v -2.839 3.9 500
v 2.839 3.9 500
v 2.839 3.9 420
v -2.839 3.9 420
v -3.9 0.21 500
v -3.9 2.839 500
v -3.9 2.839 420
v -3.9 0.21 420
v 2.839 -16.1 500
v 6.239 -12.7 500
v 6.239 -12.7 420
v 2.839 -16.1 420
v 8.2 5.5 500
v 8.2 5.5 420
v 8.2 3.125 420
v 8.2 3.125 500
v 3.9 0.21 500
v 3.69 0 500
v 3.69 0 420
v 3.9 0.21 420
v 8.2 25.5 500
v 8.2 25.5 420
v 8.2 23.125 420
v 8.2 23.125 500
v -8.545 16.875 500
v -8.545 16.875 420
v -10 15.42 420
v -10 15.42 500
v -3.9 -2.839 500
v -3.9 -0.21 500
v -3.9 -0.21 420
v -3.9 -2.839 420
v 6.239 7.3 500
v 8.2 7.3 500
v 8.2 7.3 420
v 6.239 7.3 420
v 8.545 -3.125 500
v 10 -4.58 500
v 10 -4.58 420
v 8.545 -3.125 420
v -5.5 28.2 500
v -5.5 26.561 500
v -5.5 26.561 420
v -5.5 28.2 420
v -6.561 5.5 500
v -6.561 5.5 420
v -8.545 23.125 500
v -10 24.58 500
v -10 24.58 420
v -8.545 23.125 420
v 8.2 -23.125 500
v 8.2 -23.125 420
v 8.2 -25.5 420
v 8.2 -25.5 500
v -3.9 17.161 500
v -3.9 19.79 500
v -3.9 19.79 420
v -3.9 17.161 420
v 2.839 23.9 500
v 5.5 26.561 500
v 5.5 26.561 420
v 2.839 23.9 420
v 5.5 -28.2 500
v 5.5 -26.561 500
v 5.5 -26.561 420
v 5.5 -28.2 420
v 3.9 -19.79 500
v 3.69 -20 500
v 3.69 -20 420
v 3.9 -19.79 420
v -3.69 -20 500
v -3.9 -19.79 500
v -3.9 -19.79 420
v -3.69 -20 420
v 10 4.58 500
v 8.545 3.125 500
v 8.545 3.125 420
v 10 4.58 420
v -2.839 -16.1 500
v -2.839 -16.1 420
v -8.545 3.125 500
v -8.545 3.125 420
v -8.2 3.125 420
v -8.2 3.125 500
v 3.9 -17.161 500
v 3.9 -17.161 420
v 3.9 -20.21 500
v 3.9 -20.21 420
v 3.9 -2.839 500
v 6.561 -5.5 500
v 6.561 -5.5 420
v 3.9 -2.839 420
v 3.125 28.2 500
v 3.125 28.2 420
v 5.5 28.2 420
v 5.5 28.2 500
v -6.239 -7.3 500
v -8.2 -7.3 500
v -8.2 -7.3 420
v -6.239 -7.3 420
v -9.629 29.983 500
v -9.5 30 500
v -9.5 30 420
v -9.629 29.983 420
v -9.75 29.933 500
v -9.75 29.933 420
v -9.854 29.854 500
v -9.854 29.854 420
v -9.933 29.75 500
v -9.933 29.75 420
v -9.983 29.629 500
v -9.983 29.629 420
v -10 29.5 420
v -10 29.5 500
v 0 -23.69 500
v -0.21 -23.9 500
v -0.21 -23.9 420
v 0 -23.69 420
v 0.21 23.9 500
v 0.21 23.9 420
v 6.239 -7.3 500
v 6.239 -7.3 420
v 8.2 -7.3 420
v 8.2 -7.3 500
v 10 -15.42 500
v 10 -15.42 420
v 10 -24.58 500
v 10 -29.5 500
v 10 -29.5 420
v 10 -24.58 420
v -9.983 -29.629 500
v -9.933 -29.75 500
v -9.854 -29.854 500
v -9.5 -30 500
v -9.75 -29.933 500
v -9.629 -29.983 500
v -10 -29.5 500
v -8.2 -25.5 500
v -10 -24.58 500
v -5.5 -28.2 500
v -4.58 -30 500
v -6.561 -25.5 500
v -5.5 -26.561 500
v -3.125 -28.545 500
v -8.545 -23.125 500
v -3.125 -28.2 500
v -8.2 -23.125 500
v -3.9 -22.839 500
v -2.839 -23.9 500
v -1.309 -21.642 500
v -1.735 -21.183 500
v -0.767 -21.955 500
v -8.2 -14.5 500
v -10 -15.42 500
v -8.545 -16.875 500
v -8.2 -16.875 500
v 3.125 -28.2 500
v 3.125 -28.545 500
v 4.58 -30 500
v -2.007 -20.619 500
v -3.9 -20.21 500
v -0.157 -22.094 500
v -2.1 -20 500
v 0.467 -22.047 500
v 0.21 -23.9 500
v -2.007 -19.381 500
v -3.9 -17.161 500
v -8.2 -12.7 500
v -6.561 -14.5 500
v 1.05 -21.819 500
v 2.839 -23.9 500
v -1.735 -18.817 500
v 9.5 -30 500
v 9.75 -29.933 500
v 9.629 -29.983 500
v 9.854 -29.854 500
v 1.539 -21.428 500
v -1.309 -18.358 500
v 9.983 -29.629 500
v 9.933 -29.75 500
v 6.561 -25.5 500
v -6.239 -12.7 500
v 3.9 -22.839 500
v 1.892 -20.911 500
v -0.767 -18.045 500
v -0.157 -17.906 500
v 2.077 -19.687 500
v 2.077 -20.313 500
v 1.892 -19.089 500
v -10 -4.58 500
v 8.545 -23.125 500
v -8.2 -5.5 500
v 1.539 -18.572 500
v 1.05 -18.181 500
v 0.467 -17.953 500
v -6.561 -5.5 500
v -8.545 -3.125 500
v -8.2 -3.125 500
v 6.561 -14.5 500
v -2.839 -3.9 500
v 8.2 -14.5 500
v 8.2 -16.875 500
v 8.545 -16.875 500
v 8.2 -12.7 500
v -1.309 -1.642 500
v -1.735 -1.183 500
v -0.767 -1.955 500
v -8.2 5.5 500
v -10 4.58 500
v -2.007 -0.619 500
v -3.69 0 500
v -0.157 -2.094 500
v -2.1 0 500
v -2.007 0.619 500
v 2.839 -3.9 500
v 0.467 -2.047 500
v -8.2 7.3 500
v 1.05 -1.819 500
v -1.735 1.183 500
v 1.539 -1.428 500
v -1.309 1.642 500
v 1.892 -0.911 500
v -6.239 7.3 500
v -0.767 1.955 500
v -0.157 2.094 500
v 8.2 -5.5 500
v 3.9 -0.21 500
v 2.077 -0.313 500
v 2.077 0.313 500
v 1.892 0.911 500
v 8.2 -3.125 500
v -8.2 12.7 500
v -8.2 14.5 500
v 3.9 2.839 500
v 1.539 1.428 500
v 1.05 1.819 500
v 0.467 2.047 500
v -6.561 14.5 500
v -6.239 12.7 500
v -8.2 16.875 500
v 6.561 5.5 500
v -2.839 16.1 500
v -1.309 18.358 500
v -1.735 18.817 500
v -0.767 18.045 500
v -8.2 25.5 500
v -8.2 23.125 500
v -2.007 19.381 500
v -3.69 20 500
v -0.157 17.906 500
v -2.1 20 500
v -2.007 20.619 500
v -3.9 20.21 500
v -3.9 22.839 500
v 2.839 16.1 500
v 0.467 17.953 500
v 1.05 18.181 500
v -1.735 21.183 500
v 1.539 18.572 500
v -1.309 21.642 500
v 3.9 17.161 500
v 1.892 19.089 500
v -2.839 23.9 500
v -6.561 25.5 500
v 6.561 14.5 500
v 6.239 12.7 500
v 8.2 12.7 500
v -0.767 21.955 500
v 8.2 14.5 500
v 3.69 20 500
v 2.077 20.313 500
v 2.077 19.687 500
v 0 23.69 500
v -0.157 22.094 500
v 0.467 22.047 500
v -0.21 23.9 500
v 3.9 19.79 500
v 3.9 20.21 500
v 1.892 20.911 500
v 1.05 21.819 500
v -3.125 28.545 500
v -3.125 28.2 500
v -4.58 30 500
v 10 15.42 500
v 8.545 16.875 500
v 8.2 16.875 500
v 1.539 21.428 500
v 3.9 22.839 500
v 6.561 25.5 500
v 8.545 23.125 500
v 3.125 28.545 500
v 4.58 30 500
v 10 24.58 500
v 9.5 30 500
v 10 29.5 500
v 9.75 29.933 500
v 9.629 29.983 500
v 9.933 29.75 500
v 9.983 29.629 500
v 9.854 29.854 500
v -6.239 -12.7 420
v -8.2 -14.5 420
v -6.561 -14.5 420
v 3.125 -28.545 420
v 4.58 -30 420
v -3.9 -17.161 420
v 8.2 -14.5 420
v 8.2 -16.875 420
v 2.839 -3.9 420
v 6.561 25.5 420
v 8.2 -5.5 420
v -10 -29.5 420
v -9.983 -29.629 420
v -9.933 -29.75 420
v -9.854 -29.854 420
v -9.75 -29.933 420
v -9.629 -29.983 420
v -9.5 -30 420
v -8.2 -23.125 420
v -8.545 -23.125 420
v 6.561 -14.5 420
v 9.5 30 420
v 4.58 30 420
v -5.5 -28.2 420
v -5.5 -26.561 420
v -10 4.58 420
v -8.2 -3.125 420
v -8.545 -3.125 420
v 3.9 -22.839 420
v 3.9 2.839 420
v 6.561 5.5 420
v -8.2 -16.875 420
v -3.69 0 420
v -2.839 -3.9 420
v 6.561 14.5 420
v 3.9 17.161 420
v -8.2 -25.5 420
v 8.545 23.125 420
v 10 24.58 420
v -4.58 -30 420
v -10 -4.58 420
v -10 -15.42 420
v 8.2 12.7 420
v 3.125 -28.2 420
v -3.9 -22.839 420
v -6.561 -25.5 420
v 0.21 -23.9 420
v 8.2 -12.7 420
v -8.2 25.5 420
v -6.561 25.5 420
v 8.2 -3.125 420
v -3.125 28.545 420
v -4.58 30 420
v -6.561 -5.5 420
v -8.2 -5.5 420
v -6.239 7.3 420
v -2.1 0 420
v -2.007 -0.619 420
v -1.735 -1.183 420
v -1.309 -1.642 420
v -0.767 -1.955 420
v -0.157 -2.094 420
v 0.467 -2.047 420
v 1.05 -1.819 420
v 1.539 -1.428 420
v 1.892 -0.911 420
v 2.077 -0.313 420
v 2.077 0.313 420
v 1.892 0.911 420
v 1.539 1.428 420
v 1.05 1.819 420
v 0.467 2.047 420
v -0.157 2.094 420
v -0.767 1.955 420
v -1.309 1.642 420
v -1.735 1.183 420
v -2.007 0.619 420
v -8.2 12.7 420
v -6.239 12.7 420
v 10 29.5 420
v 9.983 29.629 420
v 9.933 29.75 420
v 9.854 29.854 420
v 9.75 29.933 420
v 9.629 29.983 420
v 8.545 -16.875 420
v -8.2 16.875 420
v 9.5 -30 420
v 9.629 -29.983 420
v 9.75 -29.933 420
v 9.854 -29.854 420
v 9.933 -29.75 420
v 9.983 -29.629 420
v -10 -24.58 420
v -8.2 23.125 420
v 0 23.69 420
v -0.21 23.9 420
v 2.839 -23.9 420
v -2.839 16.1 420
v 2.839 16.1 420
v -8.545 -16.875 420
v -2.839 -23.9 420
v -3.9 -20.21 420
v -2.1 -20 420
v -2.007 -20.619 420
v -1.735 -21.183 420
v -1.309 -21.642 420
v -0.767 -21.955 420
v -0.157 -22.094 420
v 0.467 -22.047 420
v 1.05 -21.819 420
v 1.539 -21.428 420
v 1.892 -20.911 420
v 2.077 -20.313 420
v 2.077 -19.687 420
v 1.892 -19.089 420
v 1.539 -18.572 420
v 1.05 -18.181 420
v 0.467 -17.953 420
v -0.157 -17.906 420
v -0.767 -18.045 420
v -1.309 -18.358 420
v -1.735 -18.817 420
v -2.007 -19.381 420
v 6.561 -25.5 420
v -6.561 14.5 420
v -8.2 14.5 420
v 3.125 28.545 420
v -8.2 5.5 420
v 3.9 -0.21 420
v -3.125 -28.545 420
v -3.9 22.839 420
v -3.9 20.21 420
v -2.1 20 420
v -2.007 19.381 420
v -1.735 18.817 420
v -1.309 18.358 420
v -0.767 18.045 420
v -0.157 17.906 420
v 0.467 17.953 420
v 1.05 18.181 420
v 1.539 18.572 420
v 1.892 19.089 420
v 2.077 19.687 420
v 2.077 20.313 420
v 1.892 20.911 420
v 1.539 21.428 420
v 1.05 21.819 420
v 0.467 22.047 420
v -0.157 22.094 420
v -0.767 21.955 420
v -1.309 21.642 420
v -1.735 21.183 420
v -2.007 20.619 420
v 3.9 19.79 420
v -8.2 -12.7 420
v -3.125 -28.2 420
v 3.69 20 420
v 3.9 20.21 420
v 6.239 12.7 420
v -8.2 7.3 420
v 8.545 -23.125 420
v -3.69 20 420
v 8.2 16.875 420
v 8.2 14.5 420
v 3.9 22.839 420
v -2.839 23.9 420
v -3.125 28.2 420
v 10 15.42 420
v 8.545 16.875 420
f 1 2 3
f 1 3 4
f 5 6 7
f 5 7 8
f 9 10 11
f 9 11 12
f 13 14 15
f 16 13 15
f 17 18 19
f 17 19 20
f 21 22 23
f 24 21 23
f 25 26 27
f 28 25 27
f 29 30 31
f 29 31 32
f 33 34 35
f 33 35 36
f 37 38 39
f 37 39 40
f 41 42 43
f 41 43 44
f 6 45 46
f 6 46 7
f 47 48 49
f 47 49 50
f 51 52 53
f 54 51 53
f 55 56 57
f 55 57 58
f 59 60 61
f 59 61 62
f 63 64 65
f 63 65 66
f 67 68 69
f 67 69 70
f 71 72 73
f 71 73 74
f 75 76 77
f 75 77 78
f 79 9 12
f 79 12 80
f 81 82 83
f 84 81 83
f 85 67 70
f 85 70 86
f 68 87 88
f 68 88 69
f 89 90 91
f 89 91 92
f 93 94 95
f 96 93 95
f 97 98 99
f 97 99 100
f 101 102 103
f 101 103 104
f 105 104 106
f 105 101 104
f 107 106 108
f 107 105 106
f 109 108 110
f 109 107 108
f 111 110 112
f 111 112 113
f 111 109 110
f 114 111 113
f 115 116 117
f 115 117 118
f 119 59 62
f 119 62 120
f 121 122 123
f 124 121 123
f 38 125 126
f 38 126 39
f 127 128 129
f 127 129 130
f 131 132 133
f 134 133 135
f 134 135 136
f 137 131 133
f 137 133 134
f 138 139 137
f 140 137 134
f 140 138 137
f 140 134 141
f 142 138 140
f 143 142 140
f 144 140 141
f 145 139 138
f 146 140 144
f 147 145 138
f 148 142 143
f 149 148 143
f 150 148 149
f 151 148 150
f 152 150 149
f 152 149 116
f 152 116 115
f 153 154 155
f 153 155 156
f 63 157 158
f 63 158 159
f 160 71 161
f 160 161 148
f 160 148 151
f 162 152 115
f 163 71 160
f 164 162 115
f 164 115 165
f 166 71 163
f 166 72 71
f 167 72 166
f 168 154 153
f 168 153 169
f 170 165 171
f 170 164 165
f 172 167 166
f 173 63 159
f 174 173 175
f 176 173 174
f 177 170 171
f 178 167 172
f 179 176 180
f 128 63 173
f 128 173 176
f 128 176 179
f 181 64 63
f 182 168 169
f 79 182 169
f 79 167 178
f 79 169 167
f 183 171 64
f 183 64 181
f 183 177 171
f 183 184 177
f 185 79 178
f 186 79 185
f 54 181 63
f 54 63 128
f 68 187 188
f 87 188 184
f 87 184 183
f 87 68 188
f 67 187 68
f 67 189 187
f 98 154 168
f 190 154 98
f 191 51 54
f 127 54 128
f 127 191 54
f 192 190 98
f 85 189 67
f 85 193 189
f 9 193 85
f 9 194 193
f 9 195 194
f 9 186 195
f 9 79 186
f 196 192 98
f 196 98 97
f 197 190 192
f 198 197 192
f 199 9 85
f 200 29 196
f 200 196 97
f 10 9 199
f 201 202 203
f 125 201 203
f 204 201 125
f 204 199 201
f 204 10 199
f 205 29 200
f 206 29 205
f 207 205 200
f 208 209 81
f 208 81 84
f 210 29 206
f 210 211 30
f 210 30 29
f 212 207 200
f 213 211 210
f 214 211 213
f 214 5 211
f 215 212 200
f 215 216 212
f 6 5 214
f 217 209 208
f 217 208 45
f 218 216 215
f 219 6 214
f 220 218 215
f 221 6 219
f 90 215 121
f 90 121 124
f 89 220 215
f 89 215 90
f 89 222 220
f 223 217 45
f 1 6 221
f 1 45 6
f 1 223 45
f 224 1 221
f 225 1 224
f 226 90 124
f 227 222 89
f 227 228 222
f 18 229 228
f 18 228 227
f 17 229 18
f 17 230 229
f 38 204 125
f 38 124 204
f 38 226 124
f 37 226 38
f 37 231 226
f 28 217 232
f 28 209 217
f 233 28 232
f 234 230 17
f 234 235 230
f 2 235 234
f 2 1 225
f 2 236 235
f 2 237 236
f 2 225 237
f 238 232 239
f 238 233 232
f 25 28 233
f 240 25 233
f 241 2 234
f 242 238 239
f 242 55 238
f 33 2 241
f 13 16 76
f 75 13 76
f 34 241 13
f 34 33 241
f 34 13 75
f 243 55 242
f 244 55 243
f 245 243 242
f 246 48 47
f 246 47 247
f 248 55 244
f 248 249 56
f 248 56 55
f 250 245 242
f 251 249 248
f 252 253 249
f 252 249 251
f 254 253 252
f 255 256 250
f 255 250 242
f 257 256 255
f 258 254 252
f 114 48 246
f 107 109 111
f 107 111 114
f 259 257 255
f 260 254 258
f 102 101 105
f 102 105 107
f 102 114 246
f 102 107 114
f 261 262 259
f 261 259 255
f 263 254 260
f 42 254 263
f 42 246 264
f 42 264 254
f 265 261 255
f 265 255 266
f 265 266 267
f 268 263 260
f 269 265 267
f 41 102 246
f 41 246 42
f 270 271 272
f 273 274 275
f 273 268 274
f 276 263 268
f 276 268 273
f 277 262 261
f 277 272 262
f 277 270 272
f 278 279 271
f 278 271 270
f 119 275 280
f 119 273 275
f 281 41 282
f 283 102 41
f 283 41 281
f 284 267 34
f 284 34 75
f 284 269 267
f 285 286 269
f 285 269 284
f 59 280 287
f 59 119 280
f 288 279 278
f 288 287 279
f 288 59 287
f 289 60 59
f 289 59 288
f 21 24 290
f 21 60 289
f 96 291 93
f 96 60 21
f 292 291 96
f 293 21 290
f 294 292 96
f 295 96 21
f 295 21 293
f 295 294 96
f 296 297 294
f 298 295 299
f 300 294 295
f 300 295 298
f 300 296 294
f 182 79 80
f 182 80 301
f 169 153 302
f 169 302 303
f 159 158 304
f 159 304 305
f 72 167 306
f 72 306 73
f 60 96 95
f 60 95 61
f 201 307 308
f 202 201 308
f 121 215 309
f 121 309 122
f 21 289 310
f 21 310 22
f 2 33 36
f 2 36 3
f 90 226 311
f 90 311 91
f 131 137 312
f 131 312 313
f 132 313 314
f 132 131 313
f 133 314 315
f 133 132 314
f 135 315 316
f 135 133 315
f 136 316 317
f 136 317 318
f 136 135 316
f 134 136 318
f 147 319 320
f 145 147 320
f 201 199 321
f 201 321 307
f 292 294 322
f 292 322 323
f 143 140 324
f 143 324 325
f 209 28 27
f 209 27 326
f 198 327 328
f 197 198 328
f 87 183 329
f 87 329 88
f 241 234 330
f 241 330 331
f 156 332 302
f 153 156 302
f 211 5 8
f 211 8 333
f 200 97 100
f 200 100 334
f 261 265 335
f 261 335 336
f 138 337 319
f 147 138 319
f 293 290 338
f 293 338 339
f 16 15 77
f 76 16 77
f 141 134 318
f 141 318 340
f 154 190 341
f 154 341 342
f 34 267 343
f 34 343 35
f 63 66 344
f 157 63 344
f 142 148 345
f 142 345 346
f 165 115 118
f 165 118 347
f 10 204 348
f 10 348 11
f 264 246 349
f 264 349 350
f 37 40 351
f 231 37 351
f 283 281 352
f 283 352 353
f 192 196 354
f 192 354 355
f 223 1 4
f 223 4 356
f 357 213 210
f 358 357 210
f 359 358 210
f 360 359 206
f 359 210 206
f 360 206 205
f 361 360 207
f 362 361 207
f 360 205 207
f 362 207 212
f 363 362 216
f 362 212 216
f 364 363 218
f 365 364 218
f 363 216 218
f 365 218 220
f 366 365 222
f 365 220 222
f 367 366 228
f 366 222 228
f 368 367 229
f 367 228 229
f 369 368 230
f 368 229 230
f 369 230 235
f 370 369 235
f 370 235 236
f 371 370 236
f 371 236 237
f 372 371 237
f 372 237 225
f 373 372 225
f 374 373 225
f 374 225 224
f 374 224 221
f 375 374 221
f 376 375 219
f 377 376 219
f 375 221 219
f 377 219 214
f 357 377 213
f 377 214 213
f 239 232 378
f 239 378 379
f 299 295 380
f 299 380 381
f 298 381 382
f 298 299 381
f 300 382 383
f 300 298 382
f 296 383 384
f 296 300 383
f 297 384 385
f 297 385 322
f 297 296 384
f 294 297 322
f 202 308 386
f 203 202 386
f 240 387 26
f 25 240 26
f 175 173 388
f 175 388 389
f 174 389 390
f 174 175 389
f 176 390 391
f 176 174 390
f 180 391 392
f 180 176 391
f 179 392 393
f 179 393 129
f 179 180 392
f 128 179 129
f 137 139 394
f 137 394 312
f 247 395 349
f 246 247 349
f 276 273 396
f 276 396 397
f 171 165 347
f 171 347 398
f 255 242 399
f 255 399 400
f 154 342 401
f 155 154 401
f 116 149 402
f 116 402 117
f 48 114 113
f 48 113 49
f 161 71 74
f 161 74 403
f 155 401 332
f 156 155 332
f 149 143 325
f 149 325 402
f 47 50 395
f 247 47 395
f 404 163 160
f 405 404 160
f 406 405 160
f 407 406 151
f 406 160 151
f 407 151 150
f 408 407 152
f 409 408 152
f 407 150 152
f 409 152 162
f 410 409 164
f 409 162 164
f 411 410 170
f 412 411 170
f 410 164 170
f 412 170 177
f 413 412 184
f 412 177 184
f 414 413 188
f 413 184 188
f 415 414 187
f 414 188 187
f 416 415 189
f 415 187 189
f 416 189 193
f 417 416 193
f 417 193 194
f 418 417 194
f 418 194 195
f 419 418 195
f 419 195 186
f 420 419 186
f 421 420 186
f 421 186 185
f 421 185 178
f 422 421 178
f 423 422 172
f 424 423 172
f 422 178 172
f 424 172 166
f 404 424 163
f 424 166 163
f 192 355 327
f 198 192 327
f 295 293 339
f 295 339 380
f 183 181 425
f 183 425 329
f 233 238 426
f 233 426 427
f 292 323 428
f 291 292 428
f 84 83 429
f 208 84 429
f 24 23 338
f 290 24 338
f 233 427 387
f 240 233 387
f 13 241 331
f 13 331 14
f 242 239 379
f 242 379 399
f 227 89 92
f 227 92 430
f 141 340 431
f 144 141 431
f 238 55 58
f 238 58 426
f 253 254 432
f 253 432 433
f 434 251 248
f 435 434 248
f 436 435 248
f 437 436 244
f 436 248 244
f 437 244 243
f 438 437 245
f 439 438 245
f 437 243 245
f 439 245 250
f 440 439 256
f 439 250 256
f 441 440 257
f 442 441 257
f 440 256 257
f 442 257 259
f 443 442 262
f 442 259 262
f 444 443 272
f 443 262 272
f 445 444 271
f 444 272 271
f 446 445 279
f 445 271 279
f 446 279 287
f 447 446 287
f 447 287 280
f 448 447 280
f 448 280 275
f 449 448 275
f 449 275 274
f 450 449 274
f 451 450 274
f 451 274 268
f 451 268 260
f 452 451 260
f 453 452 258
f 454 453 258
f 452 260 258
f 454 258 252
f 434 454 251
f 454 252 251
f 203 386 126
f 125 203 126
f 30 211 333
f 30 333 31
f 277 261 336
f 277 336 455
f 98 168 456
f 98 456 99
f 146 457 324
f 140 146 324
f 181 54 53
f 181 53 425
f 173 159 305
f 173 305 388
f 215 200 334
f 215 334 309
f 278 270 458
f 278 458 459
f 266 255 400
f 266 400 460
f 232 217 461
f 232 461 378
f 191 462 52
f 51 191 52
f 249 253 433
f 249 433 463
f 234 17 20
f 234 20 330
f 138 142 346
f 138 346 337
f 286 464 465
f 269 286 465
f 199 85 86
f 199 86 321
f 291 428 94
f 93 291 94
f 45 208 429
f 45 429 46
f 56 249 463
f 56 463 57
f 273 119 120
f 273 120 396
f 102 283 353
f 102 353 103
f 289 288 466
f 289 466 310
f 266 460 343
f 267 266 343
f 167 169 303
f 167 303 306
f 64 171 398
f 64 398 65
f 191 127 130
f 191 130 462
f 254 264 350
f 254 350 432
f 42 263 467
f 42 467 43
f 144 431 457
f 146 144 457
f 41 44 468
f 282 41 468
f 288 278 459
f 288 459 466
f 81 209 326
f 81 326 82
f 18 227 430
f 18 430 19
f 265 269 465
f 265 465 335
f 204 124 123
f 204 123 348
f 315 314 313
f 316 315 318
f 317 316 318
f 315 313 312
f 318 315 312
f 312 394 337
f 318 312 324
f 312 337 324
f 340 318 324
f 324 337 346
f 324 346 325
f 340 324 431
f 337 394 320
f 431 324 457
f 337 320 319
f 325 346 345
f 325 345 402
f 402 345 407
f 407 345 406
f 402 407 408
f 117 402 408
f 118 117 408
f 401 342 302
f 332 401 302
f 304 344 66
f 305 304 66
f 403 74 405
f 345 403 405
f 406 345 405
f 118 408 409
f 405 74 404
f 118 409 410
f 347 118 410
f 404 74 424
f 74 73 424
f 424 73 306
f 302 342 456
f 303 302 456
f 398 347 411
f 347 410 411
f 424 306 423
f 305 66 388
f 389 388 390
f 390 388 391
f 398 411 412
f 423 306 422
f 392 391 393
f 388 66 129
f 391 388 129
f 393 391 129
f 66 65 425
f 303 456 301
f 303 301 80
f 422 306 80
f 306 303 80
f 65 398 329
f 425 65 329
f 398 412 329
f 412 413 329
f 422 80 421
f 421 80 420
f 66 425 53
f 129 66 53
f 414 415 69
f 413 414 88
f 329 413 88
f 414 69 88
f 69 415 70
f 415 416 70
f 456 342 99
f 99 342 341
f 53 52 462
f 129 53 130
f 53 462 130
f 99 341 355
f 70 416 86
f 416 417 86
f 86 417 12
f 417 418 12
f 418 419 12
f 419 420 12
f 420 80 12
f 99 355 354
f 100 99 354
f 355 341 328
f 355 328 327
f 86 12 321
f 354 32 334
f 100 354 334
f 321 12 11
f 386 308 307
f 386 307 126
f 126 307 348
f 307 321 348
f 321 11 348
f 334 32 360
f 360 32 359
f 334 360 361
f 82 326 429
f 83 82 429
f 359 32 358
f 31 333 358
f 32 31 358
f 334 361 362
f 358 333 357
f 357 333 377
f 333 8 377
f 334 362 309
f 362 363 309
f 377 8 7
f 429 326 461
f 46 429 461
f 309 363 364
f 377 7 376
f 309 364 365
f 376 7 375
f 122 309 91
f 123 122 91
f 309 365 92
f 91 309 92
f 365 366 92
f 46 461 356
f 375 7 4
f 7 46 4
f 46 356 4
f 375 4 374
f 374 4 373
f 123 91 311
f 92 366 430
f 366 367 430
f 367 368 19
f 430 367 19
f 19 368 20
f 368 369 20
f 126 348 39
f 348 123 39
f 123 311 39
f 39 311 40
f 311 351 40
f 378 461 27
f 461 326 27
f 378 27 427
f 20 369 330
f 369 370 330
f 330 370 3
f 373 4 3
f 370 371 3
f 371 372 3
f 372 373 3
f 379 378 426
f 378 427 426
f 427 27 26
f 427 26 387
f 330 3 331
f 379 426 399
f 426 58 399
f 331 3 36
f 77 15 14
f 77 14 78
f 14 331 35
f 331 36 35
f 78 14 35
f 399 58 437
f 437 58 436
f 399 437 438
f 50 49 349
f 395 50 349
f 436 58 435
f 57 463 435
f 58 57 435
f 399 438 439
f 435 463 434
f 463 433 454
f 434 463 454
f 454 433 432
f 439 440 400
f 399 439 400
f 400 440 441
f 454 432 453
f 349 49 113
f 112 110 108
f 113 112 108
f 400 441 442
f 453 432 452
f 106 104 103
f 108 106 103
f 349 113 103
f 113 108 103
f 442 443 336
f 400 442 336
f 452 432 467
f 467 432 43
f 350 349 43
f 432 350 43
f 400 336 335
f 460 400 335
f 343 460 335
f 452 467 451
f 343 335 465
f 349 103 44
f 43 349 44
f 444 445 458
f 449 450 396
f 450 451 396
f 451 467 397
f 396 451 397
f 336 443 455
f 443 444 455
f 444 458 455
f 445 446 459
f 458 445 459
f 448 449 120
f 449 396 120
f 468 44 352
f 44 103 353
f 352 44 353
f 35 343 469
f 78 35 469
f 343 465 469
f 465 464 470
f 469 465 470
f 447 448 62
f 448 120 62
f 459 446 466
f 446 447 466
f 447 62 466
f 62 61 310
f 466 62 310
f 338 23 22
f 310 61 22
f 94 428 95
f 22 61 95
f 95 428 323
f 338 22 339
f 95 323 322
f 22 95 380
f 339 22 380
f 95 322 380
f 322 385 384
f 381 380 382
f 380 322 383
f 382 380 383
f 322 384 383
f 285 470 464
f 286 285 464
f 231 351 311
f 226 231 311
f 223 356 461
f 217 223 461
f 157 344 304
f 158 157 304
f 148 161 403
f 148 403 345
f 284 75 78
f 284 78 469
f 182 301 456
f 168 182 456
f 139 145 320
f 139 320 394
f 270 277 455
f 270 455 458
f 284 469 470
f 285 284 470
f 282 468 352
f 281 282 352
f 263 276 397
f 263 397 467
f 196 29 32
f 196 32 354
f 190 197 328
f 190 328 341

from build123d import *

# Parameters (mm, degrees)
SKETCH1_R           = 2.1
BOSS_EXTRUDE1_DEPTH = 80


with BuildPart() as part:
    # Sketch1 → Boss-Extrude1 (new body)
    with BuildSketch(Plane.XY.offset(500)):
        with BuildLine():
            Line((6.560660172, 14.5), (3.9, 17.160660172))
            Line((3.9, 17.160660172), (3.9, 19.79))
            Line((3.9, 19.79), (3.69, 20))
            Line((3.69, 20), (3.9, 20.21))
            Line((3.9, 20.21), (3.9, 22.839339828))
            Line((3.9, 22.839339828), (6.560660172, 25.5))
            Line((6.560660172, 25.5), (8.2, 25.5))
            Line((8.2, 25.5), (8.2, 23.125))
            Line((8.2, 23.125), (8.545, 23.125))
            Line((8.545, 23.125), (10, 24.58))
            Line((10, 24.58), (10, 29.5))
            ThreePointArc((10, 29.5), (9.853553391, 29.853553391), (9.5, 30))
            Line((9.5, 30), (4.58, 30))
            Line((4.58, 30), (3.125, 28.545))
            Line((3.125, 28.545), (3.125, 28.2))
            Line((3.125, 28.2), (5.5, 28.2))
            Line((5.5, 28.2), (5.5, 26.560660172))
            Line((5.5, 26.560660172), (2.839339828, 23.9))
            Line((2.839339828, 23.9), (0.21, 23.9))
            Line((0.21, 23.9), (0, 23.69))
            Line((0, 23.69), (-0.21, 23.9))
            Line((-0.21, 23.9), (-2.839339828, 23.9))
            Line((-2.839339828, 23.9), (-5.5, 26.560660172))
            Line((-5.5, 26.560660172), (-5.5, 28.2))
            Line((-5.5, 28.2), (-3.125, 28.2))
            Line((-3.125, 28.2), (-3.125, 28.545))
            Line((-3.125, 28.545), (-4.58, 30))
            Line((-4.58, 30), (-9.5, 30))
            ThreePointArc((-9.5, 30), (-9.853553391, 29.853553391), (-10, 29.5))
            Line((-10, 29.5), (-10, 24.58))
            Line((-10, 24.58), (-8.545, 23.125))
            Line((-8.545, 23.125), (-8.2, 23.125))
            Line((-8.2, 23.125), (-8.2, 25.5))
            Line((-8.2, 25.5), (-6.560660172, 25.5))
            Line((-6.560660172, 25.5), (-3.9, 22.839339828))
            Line((-3.9, 22.839339828), (-3.9, 20.21))
            Line((-3.9, 20.21), (-3.69, 20))
            Line((-3.69, 20), (-3.9, 19.79))
            Line((-3.9, 19.79), (-3.9, 17.160660172))
            Line((-3.9, 17.160660172), (-6.560660172, 14.5))
            Line((-6.560660172, 14.5), (-8.2, 14.5))
            Line((-8.2, 14.5), (-8.2, 16.875))
            Line((-8.2, 16.875), (-8.545, 16.875))
            Line((-8.545, 16.875), (-10, 15.42))
            Line((-10, 15.42), (-10, 4.58))
            Line((-10, 4.58), (-8.545, 3.125))
            Line((-8.545, 3.125), (-8.2, 3.125))
            Line((-8.2, 3.125), (-8.2, 5.5))
            Line((-8.2, 5.5), (-6.560660172, 5.5))
            Line((-6.560660172, 5.5), (-3.9, 2.839339828))
            Line((-3.9, 2.839339828), (-3.9, 0.21))
            Line((-3.9, 0.21), (-3.69, 0))
            Line((-3.69, 0), (-3.9, -0.21))
            Line((-3.9, -0.21), (-3.9, -2.839339828))
            Line((-3.9, -2.839339828), (-6.560660172, -5.5))
            Line((-6.560660172, -5.5), (-8.2, -5.5))
            Line((-8.2, -5.5), (-8.2, -3.125))
            Line((-8.2, -3.125), (-8.545, -3.125))
            Line((-8.545, -3.125), (-10, -4.58))
            Line((-10, -4.58), (-10, -15.42))
            Line((-10, -15.42), (-8.545, -16.875))
            Line((-8.545, -16.875), (-8.2, -16.875))
            Line((-8.2, -16.875), (-8.2, -14.5))
            Line((-8.2, -14.5), (-6.560660172, -14.5))
            Line((-6.560660172, -14.5), (-3.9, -17.160660172))
            Line((-3.9, -17.160660172), (-3.9, -19.79))
            Line((-3.9, -19.79), (-3.69, -20))
            Line((-3.69, -20), (-3.9, -20.21))
            Line((-3.9, -20.21), (-3.9, -22.839339828))
            Line((-3.9, -22.839339828), (-6.560660172, -25.5))
            Line((-6.560660172, -25.5), (-8.2, -25.5))
            Line((-8.2, -25.5), (-8.2, -23.125))
            Line((-8.2, -23.125), (-8.545, -23.125))
            Line((-8.545, -23.125), (-10, -24.58))
            Line((-10, -24.58), (-10, -29.5))
            ThreePointArc((-10, -29.5), (-9.853553391, -29.853553391), (-9.5, -30))
            Line((-9.5, -30), (-4.58, -30))
            Line((-4.58, -30), (-3.125, -28.545))
            Line((-3.125, -28.545), (-3.125, -28.2))
            Line((-3.125, -28.2), (-5.5, -28.2))
            Line((-5.5, -28.2), (-5.5, -26.560660172))
            Line((-5.5, -26.560660172), (-2.839339828, -23.9))
            Line((-2.839339828, -23.9), (-0.21, -23.9))
            Line((-0.21, -23.9), (0, -23.69))
            Line((0, -23.69), (0.21, -23.9))
            Line((0.21, -23.9), (2.839339828, -23.9))
            Line((2.839339828, -23.9), (5.5, -26.560660172))
            Line((5.5, -26.560660172), (5.5, -28.2))
            Line((5.5, -28.2), (3.125, -28.2))
            Line((3.125, -28.2), (3.125, -28.545))
            Line((3.125, -28.545), (4.58, -30))
            Line((4.58, -30), (9.5, -30))
            ThreePointArc((9.5, -30), (9.853553391, -29.853553391), (10, -29.5))
            Line((10, -29.5), (10, -24.58))
            Line((10, -24.58), (8.545, -23.125))
            Line((8.545, -23.125), (8.2, -23.125))
            Line((8.2, -23.125), (8.2, -25.5))
            Line((8.2, -25.5), (6.560660172, -25.5))
            Line((6.560660172, -25.5), (3.9, -22.839339828))
            Line((3.9, -22.839339828), (3.9, -20.21))
            Line((3.9, -20.21), (3.69, -20))
            Line((3.69, -20), (3.9, -19.79))
            Line((3.9, -19.79), (3.9, -17.160660172))
            Line((3.9, -17.160660172), (6.560660172, -14.5))
            Line((6.560660172, -14.5), (8.2, -14.5))
            Line((8.2, -14.5), (8.2, -16.875))
            Line((8.2, -16.875), (8.545, -16.875))
            Line((8.545, -16.875), (10, -15.42))
            Line((10, -15.42), (10, -4.58))
            Line((10, -4.58), (8.545, -3.125))
            Line((8.545, -3.125), (8.2, -3.125))
            Line((8.2, -3.125), (8.2, -5.5))
            Line((8.2, -5.5), (6.560660172, -5.5))
            Line((6.560660172, -5.5), (3.9, -2.839339828))
            Line((3.9, -2.839339828), (3.9, -0.21))
            Line((3.9, -0.21), (3.69, 0))
            Line((3.69, 0), (3.9, 0.21))
            Line((3.9, 0.21), (3.9, 2.839339828))
            Line((3.9, 2.839339828), (6.560660172, 5.5))
            Line((6.560660172, 5.5), (8.2, 5.5))
            Line((8.2, 5.5), (8.2, 3.125))
            Line((8.2, 3.125), (8.545, 3.125))
            Line((8.545, 3.125), (10, 4.58))
            Line((10, 4.58), (10, 15.42))
            Line((10, 15.42), (8.545, 16.875))
            Line((8.545, 16.875), (8.2, 16.875))
            Line((8.2, 16.875), (8.2, 14.5))
            Line((8.2, 14.5), (6.560660172, 14.5))
        make_face()
        with Locations(Location((0, 20, 0), (0, 0, 180))):
            Circle(SKETCH1_R, mode=Mode.SUBTRACT)
        with Locations(Location((0, 0, 0), (0, 0, 180))):
            Circle(SKETCH1_R, mode=Mode.SUBTRACT)
        with Locations(Location((0, -20, 0), (0, 0, 180))):
            Circle(SKETCH1_R, mode=Mode.SUBTRACT)
        Polygon((2.839339828, 3.9), (-2.839339828, 3.9), (-6.239339828, 7.3), (-8.2, 7.3), (-8.2, 12.7), (-6.239339828, 12.7), (-2.839339828, 16.1), (2.839339828, 16.1), (6.239339828, 12.7), (8.2, 12.7), (8.2, 7.3), (6.239339828, 7.3), align=None, mode=Mode.SUBTRACT)
        Polygon((2.839339828, -16.1), (-2.839339828, -16.1), (-6.239339828, -12.7), (-8.2, -12.7), (-8.2, -7.3), (-6.239339828, -7.3), (-2.839339828, -3.9), (2.839339828, -3.9), (6.239339828, -7.3), (8.2, -7.3), (8.2, -12.7), (6.239339828, -12.7), align=None, mode=Mode.SUBTRACT)
    extrude(amount=-BOSS_EXTRUDE1_DEPTH)


solid = part.part
